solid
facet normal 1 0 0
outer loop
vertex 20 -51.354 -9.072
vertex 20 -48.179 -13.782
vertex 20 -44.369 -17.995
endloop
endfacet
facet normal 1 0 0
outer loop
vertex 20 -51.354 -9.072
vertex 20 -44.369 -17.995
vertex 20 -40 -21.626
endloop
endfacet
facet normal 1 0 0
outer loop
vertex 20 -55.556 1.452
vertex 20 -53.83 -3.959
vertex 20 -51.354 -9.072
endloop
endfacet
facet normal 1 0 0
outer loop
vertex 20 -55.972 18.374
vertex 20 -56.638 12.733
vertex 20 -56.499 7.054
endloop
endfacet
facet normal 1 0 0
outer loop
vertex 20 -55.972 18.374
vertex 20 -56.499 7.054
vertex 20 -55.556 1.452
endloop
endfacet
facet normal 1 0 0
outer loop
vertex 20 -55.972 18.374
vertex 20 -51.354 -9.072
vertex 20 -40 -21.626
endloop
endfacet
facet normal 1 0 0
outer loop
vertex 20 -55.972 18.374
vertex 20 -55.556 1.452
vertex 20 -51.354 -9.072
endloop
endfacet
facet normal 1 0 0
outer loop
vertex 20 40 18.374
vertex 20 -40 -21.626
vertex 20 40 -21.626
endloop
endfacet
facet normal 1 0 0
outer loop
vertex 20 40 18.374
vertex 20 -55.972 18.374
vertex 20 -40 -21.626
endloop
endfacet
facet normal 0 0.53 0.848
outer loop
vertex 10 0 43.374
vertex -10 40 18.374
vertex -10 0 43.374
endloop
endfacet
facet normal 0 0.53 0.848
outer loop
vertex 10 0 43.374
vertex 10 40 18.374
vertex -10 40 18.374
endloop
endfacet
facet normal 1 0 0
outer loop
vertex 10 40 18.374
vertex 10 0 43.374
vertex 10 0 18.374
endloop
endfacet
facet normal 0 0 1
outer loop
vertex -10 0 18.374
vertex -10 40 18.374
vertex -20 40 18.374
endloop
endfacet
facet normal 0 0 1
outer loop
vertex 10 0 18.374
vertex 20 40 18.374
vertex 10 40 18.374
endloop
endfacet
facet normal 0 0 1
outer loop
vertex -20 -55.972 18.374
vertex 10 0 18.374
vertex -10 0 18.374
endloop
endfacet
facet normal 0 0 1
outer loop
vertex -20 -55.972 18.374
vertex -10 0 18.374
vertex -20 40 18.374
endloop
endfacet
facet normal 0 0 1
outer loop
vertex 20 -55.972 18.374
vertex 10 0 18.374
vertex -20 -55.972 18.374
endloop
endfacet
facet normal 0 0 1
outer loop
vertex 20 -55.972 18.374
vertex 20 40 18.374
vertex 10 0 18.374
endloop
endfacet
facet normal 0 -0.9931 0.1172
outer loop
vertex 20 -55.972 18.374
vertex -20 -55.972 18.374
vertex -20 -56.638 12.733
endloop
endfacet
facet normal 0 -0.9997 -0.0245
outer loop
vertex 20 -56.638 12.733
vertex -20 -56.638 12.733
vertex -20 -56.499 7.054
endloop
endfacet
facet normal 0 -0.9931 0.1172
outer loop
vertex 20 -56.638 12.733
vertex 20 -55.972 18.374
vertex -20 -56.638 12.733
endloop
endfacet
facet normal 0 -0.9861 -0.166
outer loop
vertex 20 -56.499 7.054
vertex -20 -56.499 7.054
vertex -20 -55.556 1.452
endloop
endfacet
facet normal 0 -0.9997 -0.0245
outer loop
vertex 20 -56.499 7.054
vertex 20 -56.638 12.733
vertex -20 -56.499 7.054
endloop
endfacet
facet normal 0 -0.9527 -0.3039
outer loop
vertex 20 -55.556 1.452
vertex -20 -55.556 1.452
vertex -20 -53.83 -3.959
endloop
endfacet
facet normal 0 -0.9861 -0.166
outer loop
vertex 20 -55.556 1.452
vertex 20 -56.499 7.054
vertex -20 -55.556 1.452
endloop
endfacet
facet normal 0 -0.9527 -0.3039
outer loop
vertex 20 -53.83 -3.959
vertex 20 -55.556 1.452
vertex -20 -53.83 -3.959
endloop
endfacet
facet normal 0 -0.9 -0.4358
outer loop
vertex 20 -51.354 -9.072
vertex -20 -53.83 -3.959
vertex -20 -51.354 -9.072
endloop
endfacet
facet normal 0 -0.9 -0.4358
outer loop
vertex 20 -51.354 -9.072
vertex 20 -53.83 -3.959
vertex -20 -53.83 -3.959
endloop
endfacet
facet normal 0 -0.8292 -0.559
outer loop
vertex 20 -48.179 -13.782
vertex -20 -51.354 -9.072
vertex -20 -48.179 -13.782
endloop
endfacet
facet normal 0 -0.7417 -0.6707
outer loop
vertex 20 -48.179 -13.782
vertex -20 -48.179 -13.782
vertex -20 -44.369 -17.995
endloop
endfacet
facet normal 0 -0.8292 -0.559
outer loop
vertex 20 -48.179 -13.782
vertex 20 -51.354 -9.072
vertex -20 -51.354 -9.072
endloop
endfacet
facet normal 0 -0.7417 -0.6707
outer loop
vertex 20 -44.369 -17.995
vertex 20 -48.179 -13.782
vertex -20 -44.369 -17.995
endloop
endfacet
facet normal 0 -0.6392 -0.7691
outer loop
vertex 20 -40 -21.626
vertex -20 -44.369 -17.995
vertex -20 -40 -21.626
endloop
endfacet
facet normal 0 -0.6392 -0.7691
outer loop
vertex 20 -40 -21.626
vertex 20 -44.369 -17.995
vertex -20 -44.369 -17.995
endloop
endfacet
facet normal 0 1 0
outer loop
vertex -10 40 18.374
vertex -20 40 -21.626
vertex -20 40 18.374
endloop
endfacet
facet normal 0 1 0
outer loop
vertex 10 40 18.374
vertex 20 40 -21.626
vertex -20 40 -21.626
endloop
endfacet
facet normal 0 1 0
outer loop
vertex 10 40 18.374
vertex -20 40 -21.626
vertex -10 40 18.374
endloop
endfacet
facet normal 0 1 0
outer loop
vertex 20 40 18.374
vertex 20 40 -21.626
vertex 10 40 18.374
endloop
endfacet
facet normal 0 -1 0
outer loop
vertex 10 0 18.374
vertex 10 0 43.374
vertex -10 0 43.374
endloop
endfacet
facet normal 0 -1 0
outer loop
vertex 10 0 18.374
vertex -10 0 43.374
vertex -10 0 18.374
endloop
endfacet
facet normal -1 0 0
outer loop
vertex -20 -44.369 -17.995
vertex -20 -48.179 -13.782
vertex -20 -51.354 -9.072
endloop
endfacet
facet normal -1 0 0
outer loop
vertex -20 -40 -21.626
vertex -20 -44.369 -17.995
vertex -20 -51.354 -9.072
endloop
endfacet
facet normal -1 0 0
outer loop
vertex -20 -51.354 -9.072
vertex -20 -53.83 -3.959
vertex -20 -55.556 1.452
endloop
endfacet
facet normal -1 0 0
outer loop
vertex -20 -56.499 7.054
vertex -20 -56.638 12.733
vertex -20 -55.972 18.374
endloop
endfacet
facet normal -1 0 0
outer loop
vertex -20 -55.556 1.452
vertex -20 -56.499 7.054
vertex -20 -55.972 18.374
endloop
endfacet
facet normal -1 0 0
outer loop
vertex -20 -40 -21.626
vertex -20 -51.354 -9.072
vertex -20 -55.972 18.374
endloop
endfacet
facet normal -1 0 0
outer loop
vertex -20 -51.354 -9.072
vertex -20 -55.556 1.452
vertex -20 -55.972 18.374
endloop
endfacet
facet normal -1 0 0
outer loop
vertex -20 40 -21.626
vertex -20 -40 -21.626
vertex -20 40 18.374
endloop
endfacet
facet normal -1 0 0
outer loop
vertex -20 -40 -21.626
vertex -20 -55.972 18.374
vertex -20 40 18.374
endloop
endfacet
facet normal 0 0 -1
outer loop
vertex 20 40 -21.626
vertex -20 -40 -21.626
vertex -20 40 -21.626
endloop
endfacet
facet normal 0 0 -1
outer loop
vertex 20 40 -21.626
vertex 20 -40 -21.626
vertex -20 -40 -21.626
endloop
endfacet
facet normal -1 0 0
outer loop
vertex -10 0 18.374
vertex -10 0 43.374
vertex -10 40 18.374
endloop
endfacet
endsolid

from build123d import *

# Parameters (mm, degrees)
F1_DEPTH = 20
F3_DEPTH = 10


# Not quite as in the source:
# - a feature of the source that left no trace in its solid (it failed there, or was rolled back) is left out


with BuildPart() as f1:
    # F0 (on Right) → F1 (new body, symmetric)
    with BuildSketch(Plane.YZ):
        Polygon((-27.5, 18.3739837377), (-40, 18.3739837377), (-40, -21.6260162623), (40, -21.6260162623), (40, 18.3739837377), (11.153018102, 18.3739837377), (0, 18.3739837377), (-5, 18.3739837377), (-17.5, 18.3739837377), align=None)
        with BuildLine():
            Line((-40, -21.6260162623), (-40, 18.3739837377))
            Line((-40, 18.3739837377), (-50.9159490466, 18.3739837377))
            Line((-50.9159490466, 18.3739837377), (-55.972136481, 18.3739837377))
            ThreePointArc((-55.972136481, 18.3739837377), (-53.829536351, -3.9593330169), (-40, -21.6260162623))
        make_face()
    extrude(amount=F1_DEPTH, both=True)

    # F0 (on Right) → F3 (join, symmetric)
    with BuildSketch(Plane.YZ):
        Polygon((11.153018102, 18.3739837377), (40, 18.3739837377), (0, 43.3739837377), (0, 18.3739837377), align=None)
    extrude(amount=F3_DEPTH, both=True)


solid = f1.part
